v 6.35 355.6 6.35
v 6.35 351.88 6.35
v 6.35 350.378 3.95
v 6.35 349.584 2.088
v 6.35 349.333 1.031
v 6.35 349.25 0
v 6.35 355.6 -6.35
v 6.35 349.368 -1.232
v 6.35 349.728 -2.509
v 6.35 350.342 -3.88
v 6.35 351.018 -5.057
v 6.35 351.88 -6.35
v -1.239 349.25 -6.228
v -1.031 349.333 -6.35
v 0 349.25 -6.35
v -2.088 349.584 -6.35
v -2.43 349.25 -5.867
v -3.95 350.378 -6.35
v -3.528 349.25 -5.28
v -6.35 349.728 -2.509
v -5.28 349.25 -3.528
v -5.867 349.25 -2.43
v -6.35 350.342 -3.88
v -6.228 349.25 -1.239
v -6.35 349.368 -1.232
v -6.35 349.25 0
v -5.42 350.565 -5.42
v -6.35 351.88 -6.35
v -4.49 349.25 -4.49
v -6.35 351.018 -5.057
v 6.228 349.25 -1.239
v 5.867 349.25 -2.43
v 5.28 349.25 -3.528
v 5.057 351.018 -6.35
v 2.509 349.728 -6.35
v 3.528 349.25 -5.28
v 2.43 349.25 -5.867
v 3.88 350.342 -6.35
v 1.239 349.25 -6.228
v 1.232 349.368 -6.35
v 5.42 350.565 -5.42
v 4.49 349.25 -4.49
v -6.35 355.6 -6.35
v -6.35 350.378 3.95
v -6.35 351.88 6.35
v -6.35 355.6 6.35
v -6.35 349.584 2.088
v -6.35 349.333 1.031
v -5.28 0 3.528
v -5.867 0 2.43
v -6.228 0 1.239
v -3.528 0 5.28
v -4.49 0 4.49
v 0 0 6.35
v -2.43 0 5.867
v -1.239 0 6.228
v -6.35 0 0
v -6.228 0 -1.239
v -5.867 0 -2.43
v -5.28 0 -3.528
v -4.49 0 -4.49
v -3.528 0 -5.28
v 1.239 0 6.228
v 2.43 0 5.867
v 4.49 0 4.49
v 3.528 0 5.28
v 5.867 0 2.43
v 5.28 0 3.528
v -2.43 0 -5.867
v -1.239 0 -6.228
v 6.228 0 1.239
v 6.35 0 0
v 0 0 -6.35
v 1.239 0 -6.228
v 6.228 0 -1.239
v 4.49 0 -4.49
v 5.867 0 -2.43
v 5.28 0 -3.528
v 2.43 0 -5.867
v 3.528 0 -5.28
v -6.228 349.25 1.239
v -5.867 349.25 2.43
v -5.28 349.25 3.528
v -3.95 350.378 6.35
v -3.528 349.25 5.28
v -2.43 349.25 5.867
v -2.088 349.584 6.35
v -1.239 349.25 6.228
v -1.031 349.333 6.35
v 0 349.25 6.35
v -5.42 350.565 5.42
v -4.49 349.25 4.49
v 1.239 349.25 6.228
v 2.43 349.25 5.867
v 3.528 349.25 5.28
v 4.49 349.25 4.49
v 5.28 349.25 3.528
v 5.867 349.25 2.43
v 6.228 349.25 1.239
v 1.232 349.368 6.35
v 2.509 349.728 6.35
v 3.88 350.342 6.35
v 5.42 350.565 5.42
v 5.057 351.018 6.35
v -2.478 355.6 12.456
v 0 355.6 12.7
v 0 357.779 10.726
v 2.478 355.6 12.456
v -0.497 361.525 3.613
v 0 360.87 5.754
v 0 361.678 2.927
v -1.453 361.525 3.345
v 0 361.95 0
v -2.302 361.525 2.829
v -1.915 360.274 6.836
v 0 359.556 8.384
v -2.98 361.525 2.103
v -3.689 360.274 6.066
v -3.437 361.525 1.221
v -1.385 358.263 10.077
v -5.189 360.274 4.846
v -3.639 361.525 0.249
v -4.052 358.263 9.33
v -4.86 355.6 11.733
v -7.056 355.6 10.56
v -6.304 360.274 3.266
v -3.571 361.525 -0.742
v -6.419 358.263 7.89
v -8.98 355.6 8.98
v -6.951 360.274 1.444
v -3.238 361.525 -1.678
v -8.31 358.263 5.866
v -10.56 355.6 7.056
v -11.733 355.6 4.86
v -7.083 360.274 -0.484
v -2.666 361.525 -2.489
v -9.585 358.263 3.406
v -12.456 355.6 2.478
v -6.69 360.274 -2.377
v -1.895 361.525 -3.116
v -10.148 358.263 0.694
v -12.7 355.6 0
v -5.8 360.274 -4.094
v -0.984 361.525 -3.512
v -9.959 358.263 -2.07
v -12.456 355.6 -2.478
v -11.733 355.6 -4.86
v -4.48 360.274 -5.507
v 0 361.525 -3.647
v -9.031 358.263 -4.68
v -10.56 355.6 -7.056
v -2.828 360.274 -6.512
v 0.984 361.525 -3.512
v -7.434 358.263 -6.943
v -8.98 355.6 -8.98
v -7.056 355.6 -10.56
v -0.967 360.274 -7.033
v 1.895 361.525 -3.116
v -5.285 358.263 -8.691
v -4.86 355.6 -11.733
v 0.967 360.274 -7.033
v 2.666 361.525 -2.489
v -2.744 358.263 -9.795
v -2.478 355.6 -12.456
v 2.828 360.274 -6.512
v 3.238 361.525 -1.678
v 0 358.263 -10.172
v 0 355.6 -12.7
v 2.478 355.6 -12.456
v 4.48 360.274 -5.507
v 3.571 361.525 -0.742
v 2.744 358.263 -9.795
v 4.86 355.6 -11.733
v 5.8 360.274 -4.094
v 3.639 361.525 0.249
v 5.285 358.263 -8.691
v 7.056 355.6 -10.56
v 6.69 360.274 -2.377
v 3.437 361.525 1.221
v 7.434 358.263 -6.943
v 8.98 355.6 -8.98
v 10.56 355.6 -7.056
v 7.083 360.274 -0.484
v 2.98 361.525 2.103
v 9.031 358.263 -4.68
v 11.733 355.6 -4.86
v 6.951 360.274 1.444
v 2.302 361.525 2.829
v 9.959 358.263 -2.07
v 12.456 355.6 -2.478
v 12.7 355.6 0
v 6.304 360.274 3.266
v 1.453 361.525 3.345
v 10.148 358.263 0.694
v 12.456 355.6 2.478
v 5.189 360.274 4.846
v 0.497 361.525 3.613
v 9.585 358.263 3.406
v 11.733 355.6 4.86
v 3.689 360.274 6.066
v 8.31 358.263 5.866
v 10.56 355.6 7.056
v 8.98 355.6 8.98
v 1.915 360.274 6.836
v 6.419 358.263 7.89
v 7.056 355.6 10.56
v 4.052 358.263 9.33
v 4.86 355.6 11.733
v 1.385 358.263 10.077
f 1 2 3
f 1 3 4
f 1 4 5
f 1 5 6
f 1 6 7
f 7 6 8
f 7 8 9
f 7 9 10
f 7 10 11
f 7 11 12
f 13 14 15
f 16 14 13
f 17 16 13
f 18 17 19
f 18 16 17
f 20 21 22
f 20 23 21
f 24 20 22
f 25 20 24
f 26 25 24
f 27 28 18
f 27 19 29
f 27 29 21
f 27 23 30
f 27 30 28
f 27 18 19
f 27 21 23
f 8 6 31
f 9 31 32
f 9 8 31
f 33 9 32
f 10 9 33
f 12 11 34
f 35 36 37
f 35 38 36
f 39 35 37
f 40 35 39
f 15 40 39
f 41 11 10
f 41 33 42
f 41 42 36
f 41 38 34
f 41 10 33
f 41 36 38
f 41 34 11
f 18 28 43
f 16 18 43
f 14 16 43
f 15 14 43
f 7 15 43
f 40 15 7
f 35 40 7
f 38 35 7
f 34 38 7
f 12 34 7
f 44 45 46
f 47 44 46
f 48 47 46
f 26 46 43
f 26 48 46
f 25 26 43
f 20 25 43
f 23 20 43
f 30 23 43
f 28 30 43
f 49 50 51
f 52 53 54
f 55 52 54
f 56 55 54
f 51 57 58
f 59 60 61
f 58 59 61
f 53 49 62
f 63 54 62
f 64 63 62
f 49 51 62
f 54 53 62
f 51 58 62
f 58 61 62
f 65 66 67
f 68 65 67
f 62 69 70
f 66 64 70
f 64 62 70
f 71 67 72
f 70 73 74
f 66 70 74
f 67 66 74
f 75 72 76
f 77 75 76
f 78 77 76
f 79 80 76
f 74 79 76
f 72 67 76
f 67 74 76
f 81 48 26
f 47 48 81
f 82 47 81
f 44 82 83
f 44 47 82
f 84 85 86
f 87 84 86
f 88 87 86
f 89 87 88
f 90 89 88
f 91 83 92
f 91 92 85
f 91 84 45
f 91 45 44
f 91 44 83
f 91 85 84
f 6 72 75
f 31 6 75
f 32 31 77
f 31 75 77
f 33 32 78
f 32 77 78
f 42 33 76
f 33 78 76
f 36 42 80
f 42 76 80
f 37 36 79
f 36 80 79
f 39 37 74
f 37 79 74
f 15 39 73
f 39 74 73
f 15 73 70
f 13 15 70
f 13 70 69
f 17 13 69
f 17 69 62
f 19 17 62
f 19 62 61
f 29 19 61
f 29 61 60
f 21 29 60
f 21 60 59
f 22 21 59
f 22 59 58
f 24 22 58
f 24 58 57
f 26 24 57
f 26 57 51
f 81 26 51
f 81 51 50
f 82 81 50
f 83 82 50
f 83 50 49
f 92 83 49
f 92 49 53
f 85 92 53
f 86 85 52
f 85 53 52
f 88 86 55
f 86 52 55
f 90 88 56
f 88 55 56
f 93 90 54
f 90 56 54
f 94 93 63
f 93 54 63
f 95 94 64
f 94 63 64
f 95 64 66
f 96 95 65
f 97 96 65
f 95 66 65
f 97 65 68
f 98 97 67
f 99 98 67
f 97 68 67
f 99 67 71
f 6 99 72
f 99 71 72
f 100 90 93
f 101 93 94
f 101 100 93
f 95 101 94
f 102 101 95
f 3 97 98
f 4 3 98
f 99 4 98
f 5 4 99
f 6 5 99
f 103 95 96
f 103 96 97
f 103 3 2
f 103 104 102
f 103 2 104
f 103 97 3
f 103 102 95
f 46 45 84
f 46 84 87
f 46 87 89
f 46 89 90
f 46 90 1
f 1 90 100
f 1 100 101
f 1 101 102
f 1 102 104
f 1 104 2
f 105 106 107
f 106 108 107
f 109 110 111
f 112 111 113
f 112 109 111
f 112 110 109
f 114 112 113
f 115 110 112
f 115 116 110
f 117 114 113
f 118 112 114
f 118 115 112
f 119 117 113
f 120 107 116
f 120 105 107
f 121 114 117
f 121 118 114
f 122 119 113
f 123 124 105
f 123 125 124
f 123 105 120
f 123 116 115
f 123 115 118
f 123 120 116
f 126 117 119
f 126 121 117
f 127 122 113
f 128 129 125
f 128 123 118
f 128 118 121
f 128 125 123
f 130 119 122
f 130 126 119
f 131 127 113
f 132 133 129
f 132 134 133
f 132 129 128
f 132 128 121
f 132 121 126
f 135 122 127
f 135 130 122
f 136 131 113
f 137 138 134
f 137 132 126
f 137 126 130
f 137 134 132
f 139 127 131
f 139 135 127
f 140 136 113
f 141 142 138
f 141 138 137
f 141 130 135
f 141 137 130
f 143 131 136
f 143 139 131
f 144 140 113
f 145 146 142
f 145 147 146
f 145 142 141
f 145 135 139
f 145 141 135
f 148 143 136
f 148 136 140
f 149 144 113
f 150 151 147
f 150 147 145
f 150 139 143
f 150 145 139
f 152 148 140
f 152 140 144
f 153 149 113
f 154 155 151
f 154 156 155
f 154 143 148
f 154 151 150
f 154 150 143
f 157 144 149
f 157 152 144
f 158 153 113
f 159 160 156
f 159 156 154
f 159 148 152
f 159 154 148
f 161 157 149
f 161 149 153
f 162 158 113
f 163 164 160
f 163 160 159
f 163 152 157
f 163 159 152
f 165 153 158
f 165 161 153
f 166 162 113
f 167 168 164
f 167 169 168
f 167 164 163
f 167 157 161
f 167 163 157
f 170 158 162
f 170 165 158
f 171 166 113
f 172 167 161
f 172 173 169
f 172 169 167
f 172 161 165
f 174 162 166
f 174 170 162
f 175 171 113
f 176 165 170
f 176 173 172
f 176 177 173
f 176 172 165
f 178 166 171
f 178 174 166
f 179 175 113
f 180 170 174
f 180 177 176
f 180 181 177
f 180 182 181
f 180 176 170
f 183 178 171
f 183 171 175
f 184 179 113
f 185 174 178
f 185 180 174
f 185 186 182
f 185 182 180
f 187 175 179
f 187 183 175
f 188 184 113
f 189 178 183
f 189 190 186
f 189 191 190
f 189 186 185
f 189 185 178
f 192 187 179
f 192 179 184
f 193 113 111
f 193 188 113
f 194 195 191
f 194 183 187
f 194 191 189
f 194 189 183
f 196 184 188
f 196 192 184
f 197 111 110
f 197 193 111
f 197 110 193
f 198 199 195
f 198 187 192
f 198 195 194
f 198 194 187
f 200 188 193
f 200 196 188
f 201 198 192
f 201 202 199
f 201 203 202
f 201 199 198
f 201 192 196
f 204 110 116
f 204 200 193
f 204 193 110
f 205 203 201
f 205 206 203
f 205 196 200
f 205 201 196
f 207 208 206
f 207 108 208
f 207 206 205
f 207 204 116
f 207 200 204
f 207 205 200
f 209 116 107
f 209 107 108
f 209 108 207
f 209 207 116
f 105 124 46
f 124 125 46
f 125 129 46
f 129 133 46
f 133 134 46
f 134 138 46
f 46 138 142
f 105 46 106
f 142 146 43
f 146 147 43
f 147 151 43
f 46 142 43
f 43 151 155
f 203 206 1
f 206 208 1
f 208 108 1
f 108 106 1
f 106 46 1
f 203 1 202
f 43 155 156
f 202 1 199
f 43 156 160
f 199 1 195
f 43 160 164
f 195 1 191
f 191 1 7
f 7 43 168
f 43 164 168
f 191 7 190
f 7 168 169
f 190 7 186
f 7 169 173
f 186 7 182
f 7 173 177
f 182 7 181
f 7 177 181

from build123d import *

# Parameters (mm, degrees)
SKETCH1_R           = 6.35
BOSS_EXTRUDE1_DEPTH = 349.25
SKETCH2_W           = 12.7
SKETCH2_H           = 12.7
BOSS_EXTRUDE2_DEPTH = 6.35
SKETCH3_R           = 12.7
BOSS_EXTRUDE3_DEPTH = 6.35
SKETCH5_OUTSIDE_W   = 112.846
SKETCH5_OUTSIDE_H   = 112.846
SKETCH5_OUTSIDE_R   = 6.35
CUT_EXTRUDE1_DEPTH  = 6.35
CUT_EXTRUDE1_TAPER  = 45


with BuildPart() as part:
    # Sketch1 → Boss-Extrude1 (new body)
    with BuildSketch(Plane(origin=(0, 0, 0), x_dir=(1, 0, 0), z_dir=(0, 1, 0))):
        Circle(SKETCH1_R)
    extrude(amount=BOSS_EXTRUDE1_DEPTH)

    # Sketch2 → Boss-Extrude2 (add)
    with BuildSketch(Plane(origin=(0, 349.25, 0), x_dir=(1, 0, 0), z_dir=(0, 1, 0))):
        Rectangle(SKETCH2_W, SKETCH2_H)
    extrude(amount=BOSS_EXTRUDE2_DEPTH)

    # Sketch3 → Boss-Extrude3 (add)
    with BuildSketch(Plane(origin=(0, 355.6, 0), x_dir=(1, 0, 0), z_dir=(0, 1, 0))):
        Circle(SKETCH3_R)
    extrude(amount=BOSS_EXTRUDE3_DEPTH)

    # Sketch4 → Cut-Revolve1 (revolve, cut)
    with BuildSketch(Plane(origin=(0, 0, 0), x_dir=(0, 0, -1), z_dir=(1, 0, 0))):
        with BuildLine():
            Line((-12.7, 355.6), (-17.199061604, 355.6))
            Line((-17.199061604, 355.6), (-17.199061604, 364.492507037))
            Line((-17.199061604, 364.492507037), (0, 364.492507037))
            Line((0, 364.492507037), (0, 361.95))
            ThreePointArc((0, 361.95), (-7.099515829, 360.274031657), (-12.7, 355.6))
        make_face()
    revolve(axis=Axis((0, 369.557753648, 0), (0, -1, 0)), mode=Mode.SUBTRACT)

    # Sketch5 outside → Cut-Extrude1 (cut)
    with BuildSketch(Plane.XZ.offset(-349.25)):
        Rectangle(SKETCH5_OUTSIDE_W, SKETCH5_OUTSIDE_H)
        Circle(SKETCH5_OUTSIDE_R, mode=Mode.SUBTRACT)
    extrude(amount=-CUT_EXTRUDE1_DEPTH, taper=CUT_EXTRUDE1_TAPER, mode=Mode.SUBTRACT)


solid = part.part
